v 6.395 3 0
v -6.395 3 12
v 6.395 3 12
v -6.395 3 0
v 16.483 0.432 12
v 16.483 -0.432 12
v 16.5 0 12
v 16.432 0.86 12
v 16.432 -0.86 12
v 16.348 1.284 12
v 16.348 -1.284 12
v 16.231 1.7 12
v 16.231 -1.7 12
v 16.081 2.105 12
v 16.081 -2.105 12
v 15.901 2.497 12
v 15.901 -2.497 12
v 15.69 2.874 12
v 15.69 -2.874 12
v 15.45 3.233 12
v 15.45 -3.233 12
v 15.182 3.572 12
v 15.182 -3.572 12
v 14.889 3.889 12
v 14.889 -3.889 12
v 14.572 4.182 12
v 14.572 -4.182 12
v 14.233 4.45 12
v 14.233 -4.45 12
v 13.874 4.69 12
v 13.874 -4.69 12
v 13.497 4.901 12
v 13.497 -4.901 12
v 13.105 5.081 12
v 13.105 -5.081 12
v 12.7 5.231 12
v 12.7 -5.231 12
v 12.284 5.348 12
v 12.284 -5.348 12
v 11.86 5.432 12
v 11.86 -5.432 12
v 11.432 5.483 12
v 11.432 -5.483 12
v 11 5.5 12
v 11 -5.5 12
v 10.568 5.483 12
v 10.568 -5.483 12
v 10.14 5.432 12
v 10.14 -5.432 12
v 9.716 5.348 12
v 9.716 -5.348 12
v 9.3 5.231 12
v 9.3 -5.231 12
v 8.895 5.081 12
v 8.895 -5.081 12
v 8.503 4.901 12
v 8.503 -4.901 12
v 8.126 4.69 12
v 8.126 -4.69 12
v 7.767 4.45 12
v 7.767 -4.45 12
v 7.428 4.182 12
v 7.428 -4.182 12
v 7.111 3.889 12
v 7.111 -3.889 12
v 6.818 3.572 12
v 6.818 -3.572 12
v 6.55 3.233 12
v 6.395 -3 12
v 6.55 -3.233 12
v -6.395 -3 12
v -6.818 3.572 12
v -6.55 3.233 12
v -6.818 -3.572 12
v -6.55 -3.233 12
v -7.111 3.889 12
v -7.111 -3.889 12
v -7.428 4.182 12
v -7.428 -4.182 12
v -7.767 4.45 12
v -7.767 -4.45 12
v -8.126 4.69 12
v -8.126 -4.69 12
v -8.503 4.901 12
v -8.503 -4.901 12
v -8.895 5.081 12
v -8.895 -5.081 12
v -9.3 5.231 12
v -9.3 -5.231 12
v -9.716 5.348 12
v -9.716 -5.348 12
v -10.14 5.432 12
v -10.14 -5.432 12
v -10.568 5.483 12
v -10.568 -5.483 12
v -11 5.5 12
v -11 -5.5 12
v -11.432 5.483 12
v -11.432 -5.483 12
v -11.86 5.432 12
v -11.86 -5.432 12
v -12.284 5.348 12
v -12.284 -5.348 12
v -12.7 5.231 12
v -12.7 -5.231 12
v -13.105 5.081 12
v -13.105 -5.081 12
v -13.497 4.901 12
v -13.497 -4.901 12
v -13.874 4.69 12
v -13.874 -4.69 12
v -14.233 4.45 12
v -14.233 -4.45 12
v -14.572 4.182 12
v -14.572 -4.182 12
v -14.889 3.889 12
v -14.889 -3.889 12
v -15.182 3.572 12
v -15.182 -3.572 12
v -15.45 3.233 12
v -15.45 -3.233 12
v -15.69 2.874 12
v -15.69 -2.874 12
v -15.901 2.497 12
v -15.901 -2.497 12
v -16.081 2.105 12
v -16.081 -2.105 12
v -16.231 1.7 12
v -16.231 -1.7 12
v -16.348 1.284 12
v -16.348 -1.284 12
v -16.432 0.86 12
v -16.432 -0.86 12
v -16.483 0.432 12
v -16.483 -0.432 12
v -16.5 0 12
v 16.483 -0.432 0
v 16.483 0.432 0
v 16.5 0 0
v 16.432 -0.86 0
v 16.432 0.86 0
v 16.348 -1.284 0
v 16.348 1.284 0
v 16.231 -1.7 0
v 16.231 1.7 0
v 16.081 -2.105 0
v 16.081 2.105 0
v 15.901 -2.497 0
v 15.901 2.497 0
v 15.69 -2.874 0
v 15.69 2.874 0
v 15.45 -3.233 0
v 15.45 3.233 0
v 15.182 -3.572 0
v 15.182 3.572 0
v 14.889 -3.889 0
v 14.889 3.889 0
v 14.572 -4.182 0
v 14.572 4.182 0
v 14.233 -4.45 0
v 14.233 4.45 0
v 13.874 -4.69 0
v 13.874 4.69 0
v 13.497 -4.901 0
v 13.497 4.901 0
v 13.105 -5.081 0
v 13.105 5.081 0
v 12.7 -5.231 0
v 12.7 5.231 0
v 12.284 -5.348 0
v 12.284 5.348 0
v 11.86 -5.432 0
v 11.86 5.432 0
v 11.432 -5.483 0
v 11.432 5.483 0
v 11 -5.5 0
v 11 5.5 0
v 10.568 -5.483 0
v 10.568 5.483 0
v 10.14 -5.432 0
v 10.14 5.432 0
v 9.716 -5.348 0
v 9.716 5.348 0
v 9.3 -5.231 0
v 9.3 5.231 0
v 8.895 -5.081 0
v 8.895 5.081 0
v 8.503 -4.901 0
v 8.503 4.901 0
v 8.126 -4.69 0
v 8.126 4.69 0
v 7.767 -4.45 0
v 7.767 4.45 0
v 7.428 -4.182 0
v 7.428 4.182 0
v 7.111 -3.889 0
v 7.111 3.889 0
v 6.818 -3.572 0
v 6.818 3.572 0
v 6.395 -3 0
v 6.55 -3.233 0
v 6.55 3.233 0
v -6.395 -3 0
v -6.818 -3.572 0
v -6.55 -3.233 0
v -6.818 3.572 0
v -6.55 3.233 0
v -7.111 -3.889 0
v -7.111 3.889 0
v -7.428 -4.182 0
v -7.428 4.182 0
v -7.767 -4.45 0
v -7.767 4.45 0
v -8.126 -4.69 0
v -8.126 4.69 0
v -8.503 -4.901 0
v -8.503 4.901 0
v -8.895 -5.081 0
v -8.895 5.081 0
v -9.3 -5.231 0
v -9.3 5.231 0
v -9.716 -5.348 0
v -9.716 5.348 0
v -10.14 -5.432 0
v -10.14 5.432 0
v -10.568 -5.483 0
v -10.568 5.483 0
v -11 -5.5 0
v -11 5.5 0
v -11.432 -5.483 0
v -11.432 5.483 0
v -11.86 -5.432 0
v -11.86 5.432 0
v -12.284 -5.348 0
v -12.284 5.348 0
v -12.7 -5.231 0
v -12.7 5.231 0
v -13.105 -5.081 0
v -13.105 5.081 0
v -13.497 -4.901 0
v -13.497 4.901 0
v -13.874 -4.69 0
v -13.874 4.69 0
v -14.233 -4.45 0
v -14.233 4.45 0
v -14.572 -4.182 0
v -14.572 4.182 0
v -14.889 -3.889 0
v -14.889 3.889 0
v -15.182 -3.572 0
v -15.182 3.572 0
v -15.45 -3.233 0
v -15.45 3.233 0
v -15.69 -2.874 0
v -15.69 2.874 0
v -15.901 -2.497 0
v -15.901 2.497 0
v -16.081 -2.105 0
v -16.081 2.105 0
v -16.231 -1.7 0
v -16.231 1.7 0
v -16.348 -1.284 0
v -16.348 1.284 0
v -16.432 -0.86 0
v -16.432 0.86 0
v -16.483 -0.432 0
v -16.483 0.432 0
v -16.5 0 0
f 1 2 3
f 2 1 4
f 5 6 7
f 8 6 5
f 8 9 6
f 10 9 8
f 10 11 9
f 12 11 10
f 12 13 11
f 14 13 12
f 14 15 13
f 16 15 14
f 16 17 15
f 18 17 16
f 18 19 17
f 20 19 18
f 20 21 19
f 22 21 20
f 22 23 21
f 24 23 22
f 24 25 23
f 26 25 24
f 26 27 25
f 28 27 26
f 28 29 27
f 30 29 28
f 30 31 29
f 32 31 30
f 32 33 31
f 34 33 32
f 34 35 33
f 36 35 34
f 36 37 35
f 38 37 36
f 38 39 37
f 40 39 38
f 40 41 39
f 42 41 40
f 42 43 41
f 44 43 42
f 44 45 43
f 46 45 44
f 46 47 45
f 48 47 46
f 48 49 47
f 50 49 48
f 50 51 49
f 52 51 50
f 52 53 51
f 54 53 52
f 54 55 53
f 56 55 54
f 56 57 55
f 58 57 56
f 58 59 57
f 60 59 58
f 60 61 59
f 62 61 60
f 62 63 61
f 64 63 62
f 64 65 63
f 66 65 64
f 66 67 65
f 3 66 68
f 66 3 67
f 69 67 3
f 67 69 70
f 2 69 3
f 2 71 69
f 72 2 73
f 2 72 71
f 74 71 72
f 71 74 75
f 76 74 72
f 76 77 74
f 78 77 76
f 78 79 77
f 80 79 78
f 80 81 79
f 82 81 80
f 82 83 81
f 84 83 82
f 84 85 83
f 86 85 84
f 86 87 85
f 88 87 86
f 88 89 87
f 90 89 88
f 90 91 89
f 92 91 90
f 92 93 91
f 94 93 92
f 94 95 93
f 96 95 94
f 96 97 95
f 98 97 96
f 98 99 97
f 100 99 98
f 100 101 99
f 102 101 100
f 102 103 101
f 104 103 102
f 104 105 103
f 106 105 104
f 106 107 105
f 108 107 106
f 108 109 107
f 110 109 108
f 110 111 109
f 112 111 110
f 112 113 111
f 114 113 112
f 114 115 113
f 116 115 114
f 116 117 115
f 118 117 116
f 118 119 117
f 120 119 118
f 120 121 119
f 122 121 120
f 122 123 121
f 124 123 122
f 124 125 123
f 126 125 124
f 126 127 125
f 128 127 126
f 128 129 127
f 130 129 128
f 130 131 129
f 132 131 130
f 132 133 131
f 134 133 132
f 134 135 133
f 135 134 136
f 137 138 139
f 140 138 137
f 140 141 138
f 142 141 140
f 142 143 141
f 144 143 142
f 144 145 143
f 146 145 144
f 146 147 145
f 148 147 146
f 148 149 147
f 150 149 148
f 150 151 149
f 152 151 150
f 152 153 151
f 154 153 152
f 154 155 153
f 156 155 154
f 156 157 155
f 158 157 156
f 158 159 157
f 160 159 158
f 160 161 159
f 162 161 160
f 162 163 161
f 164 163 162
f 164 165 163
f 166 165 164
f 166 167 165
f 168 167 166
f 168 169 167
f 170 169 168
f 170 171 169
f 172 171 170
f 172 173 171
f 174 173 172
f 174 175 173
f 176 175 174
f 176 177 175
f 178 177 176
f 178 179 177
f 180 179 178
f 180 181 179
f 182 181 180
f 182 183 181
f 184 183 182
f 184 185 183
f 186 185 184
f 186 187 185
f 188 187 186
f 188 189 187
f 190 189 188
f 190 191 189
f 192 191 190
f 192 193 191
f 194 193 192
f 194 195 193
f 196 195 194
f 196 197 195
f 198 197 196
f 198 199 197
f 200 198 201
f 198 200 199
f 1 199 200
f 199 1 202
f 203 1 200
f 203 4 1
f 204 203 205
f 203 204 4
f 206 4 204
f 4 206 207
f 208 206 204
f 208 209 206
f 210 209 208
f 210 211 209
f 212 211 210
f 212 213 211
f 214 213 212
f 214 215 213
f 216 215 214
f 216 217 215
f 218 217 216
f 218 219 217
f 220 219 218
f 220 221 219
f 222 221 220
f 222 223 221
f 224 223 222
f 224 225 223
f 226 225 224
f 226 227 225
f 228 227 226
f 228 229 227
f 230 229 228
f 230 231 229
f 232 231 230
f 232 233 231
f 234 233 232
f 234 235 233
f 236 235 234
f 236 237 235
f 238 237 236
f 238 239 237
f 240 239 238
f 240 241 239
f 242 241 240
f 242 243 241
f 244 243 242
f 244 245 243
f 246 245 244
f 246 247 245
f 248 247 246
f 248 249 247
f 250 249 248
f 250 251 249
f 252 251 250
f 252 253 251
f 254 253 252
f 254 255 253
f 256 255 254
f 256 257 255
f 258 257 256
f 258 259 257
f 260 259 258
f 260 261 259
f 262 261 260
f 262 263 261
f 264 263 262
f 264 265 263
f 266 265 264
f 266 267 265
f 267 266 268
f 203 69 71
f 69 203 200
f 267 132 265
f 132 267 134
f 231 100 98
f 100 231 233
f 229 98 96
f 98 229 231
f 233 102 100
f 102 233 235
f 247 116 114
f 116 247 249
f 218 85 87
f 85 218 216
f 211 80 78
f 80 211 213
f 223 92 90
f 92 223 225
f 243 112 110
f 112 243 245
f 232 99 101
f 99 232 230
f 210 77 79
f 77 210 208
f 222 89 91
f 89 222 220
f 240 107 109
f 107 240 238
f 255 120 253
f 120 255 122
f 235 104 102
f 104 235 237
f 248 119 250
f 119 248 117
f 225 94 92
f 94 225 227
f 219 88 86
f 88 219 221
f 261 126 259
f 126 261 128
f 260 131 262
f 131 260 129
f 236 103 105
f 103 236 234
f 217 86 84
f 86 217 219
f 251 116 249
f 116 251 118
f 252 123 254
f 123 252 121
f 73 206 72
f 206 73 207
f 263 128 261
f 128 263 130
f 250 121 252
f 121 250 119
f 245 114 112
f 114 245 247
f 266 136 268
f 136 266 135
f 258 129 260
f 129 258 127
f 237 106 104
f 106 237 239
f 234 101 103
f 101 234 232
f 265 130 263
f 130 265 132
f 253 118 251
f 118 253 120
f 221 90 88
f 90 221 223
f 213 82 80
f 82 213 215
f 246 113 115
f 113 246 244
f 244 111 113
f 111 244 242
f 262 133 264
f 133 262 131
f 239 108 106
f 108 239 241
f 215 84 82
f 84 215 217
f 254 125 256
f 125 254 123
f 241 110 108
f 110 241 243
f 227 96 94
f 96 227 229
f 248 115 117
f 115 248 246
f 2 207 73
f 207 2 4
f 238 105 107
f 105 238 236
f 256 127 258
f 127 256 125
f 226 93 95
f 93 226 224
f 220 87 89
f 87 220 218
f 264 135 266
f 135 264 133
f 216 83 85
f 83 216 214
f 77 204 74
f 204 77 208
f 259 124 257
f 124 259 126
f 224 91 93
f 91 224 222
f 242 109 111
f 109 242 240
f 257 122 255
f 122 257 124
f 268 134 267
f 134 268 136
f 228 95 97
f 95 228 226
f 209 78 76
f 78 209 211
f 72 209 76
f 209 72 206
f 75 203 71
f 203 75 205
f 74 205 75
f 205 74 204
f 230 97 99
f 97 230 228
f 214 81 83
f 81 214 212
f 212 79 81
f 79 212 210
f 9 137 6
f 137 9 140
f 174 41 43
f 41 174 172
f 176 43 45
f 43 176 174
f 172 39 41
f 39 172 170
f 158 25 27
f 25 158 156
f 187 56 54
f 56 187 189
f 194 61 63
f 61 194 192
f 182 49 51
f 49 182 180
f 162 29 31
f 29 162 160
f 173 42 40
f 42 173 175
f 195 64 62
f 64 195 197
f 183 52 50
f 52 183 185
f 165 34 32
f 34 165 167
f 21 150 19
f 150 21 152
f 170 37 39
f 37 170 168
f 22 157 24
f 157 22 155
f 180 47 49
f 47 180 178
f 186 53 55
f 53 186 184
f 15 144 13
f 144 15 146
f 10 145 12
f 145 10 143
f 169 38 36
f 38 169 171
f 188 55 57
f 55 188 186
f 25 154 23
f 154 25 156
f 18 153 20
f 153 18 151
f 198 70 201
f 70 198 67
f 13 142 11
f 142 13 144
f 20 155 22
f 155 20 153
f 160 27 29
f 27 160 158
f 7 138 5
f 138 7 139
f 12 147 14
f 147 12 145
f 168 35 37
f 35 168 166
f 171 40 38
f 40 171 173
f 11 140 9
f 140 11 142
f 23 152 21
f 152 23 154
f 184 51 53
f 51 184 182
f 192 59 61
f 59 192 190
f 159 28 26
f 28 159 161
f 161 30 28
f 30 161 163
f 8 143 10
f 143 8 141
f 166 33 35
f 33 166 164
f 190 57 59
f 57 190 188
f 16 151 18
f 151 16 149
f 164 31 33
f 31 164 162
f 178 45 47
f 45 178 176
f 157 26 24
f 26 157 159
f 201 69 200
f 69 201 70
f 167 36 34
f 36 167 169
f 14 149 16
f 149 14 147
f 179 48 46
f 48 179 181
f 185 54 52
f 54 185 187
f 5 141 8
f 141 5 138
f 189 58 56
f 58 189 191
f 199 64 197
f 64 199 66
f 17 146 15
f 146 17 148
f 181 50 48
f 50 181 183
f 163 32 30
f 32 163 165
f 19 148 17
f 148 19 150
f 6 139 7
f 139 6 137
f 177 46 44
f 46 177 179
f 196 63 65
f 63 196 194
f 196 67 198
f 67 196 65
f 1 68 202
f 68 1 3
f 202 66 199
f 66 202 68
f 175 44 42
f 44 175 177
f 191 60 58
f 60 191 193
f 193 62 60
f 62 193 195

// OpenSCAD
gheight=12.;
gwidth=39.;

module bank_profile(height=gheight, width=gwidth) {
	polygon( points=[[-width/2,0], [width/2,0], [width/2,height], [-width/2,height]], convexity = -1);
}

module rail_profile_negative(height=gheight, width=gwidth) {
	polygon( points= [
        [-16,-1],
        [-16,0], [-15.5,0.5], 
        [-15.5,2.5], [-15,3], 
		[-10,3], [-9.5,2.5], 
		[-9.5,0.5], [-9,0],
		[-9,-1],

		[9,-1],
		[9,0], [9.5,0.5], 
		[9.5,2.5], [10,3], 
		[15,3], [15.5,2.5], 
		[15.5,0.5], [16,0],
		[16,-1],

        [16,height+1],
        [16,height], [15.5,height-0.5], 
		[15.5,height-2.5], [15,height-3], 
		[10,height-3], [9.5,height-2.5], 
		[9.5,height-0.5], [9,height],
		[9,height+1],
 
        [-9,height+1],
		[-9,height], [-9.5,height-0.5], 
		[-9.5,height-2.5], [-10,height-3], 
		[-15,height-3], [-15.5,height-2.5],         
		[-15.5,height-0.5], [-16,height],
		[-16,height+1] 
		],

		paths=[
          [0,1,2,3,4,5,6,7,8,9], 
          [10,11,12,13,14,15,16,17,18,19],
          [20,21,22,23,24,25,26,27,28,29],
          [30,31,32,33,34,35,36,37,38,39]
	    ]);
}

module straight_bank_raw(len=214, height=gheight, width=gwidth) {
	linear_extrude(height=len) {
		bank_profile(height=height, width=width);
	}
}

module straight_rail_negative(len=214, height=gheight, width=gwidth) {
	linear_extrude(height=len) {
		rail_profile_negative(height=height, width=width);
	}
}

module straight_rail_raw(len=214, height=gheight, width=gwidth) {
	    		rotate([90,0,0]) {
                 difference() {
                 	straight_bank_raw(len=len, height=height, width=width);
					straight_rail_negative(len=len, height=height, width=width);
				}
			}
}

module straight_rail(len=214, height=gheight, width=gwidth) {
    translate([len,0,0]) rotate([0,0,-90]) union() {
    		difference() {

			straight_rail_raw(len=len, height=height, width=width);
			translate([0,-len-0.05*17,-0.05*height]) scale([1.1,1.1,1.1]) rail_lock(height=height);
    		}
    		rail_lock(height=height);
	}
}

module straight_rail_mm(len=214, height=gheight, width=gwidth) {
	translate([len,0,0]) rotate([0,0,-90]) {
		rail_lock(height=height);
		straight_rail_raw(len=len, height=height, width=width);
		rotate([0,0,180]) translate([0,len,0]) rail_lock(height=height);
	}
}

module straight_rail_ff(len=214, height=gheight, width=gwidth) {
    translate([len,0,0]) rotate([0,0,-90]) difference() {
		difference() {
			straight_rail_raw(len=len, height=height, width=width);
			translate([0,-len-0.05*17,0]) scale([1.1,1.1,1.1]) rail_lock(height=height);
		};
		rotate([0,0,180]) translate([0,-0.05*17,0]) scale([1.1,1.1,1.1]) rail_lock(height=height);
	}
}

module curved_bank_raw(radius=200, angle=360/8, height=gheight, width=gwidth) {
	difference() {
		rotate_extrude() 
			translate([-radius,0,0]) rotate(a=[-0,0,0]) 
			bank_profile(height=height, width=width);
		
		angle_cutting_block(height=height+2, radius=radius+width, angle=angle);		
	}
}

module curved_rail_negative(radius=200, angle=360/8, height=gheight, width=gwidth) {
	difference() {
		rotate_extrude() 
			translate([-radius,0,0]) rotate(a=[0,0,0]) 
			 rail_profile_negative(height=height, width=width);
		
		translate([0,0,-1])
		angle_cutting_block(height=height+2, radius=radius+width, angle=angle);
	}
}

module curved_rail_raw(radius=200, angle=360/8, height=gheight, width=gwidth) {
	difference() {
		curved_bank_raw(radius=radius, angle=angle, height=height, width=width);
		curved_rail_negative(radius=radius, angle=angle, height=height, width=width);
	}
}

module curved_rail(radius=200, angle=360/8, height=gheight, width=gwidth) {
    translate([0,-radius,0]) union() { 
		difference() {
			curved_rail_raw(radius=radius, angle=angle, height=height, width=width);
        		translate([-0.05*17,radius,0]) rotate([0,0,-90]) scale([1.1,1.1,1.1]) rail_lock(height=height);
		}
    		rotate([0,0,-angle]) translate([0,radius,0]) rotate([0,0,-90]) rail_lock(height=height);
	}
}

module curved_rail_mm(radius=200, angle=360/8, height=gheight, width=gwidth) {
	translate([0,-radius,0]) union() {
		rotate([0,0,-angle]) translate([0,radius,0]) rotate([0,0,-90]) rail_lock(height=height);
		curved_rail_raw(radius=radius, angle=angle, height=height, width=width);
		translate([0,radius,0]) rotate([0,0,90]) rail_lock(height=height);
	}
}

module curved_rail_ff(radius=200, angle=360/8, height=gheight, width=gwidth) {
	translate([0,-radius,0]) difference() {
		difference() {
			curved_rail_raw(radius=radius, angle=angle, height=height, width=width);
			translate([-0.05*17,radius,0]) rotate([0,0,-90]) scale([1.1,1.1,1.1]) rail_lock(height=height);
		}
		rotate([0,0,-angle]) translate([0.05*17,radius,0]) rotate([0,0,90]) scale([1.1,1.1,1.1]) rail_lock(height=height);
	}
}

module rail_lock(height=gheight) {
	translate([-3,-1,0]) cube([6, 8, height]);
	translate([0,11,0]) cylinder(h=height, d=11);
}

module male_male_rail_lock(height=gheight) {
	rotate([0,0,90]) union() {
		rotate([0,0,180]) rail_lock(height=height);
		rail_lock(height=height);
	}
}

module angle_cutting_block(height, radius ,angle) {
    linear_extrude(height=height) {
    		if (sin(angle) > 0) {
			polygon(points = [ [0, radius], [0, 0],
				[sin(angle)*radius, cos(angle)*radius],
        			[radius, cos(angle)*radius],
        			[radius, -radius],
        			[-radius, -radius],
        			[-radius, radius] 
			]);
    		} else {
			polygon(points = [ [0,radius], [0,0],
				[sin(angle)*radius, cos(angle)*radius],
				[-radius, cos(angle)*radius],
				[-radius, radius]
			]);
    		}
	}
}

module shunt_raw(len=214, height=gheight, width=gwidth, radius=200, angle=360/8) {
    difference() {
	    union() {
            rotate([90,0,90]) 
            straight_bank_raw(len=len, height=height, width=width);
            translate([0,-radius,0]) 
            curved_bank_raw(radius=radius, angle=angle, height=height, width=width);
	    };
        union() {
            rotate([90,0,90]) 
            straight_rail_negative(len=len, height=height, width=width);
            translate([0,-radius,0]) 
            curved_rail_negative(radius=radius, angle=angle, height=height, width=width);
        }
    }	
}

module shunt_mff(len=151, height=gheight, width=gwidth, radius=200, angle=360/8) {
	difference() {
        union() {
    		    difference() {
                shunt_raw(len=len, height=height, width=width, radius=radius, angle=angle);
			    translate([len-0.05*17,0,-0.05*height]) scale([1.1,1.1,1.1]) 
                 rotate([0,0,90]) rail_lock(height=height);
    		    }
    		    rotate([0,0,90]) rail_lock(height=height);
	    };
	    translate([0,-radius,0]) rotate([0,0,-angle]) 
        translate([0,radius,0]) rotate([0,0,90]) 
        scale([1.1,1.1,1.1]) rail_lock(height=height);	
    }
}

module shunt_fmm(len=151, height=gheight, width=gwidth, radius=200, angle=360/8) {
	union() {
        difference() {
    		    union() {
                shunt_raw(len=len, height=height, width=width, radius=radius, angle=angle);
			    translate([len,0,0]) 
                 rotate([0,0,-90]) rail_lock(height=height);
    		    };
    		    translate([0.05*17,0,0]) rotate([0,0,-90]) scale([1.1,1.1,1.1]) 
            rail_lock(height=height);
	    };
        translate([0,-radius,0]) rotate([0,0,-angle]) 
        translate([0,radius,0]) rotate([0,0,-90]) 
        rail_lock(height=height);	
    }
}

module shunt_3way_raw(len=151, height=gheight, width=gwidth, radius=200, angle=360/8) {
    difference() {
	    union() {
            rotate([90,0,90]) 
            straight_bank_raw(len=len, height=height, width=width);
            translate([0,-radius,0]) 
            curved_bank_raw(radius=radius, angle=angle, height=height, width=width);
            rotate([180,0,0]) translate([0,-radius,-height]) 
            curved_bank_raw(radius=radius, angle=angle, height=height, width=width);

	    };
        union() {
            rotate([90,0,90]) 
            straight_rail_negative(len=len, height=height, width=width);
            translate([0,-radius,0]) 
            curved_rail_negative(radius=radius, angle=angle, height=height, width=width);
            rotate([180,0,0]) translate([0,-radius,-height]) 
            curved_rail_negative(radius=radius, angle=angle, height=height, width=width);
        }
    }	
}

module shunt_3way_fmmm(len=151, height=gheight, width=gwidth, radius=200, angle=360/8) {
    difference() {
	    shunt_3way_raw(len=len, height=height, width=width, radius=radius, angle=angle);
        translate([-0.05*17,0,-0.5]) rotate([0,0,-90]) scale([1.1,1.1,1.1]) 
        rail_lock(height=height);
    }
    translate([len,0,0]) rotate([0,0,-90]) rail_lock(height=height);
    translate([0,-radius,0]) rotate([0,0,-angle]) translate([0,radius,0]) rotate([0,0,-90]) rail_lock(height=height);
    translate([0,radius,0]) rotate([0,0,angle]) translate([0,-radius,0]) rotate([0,0,-90]) rail_lock(height=height);
}

module shunt_3way_mfff(len=151, height=gheight, width=gwidth, radius=200, angle=360/8) {
    difference() {
        union() {
	        shunt_3way_raw(len=len, height=height, width=width, radius=radius, angle=angle);
            rotate([0,0,90]) 
            rail_lock(height=height);
        };
        union() {
            translate([len+0.05*17,0,-0.5]) rotate([0,0,90]) scale([1.1,1.1,1.1]) 
            rail_lock(height=height);
        
            translate([0,-radius,0]) rotate([0,0,-angle]) 
            translate([0.05*17,radius,-0.5]) rotate([0,0,90]) 
            scale([1.1,1.1,1.1]) rail_lock(height=height);
    
            translate([0,radius,0]) rotate([0,0,angle]) 
            translate([0.05*17,-radius,-0.5]) rotate([0,0,90]) 
            scale([1.1,1.1,1.1]) rail_lock(height=height);
	    }
    }
}

module shunt_t_raw(height=gheight, width=gwidth, radius=100) {
	angle=90;
    len=2*radius;
	
    difference() {
	    union() {
            rotate([90,0,90]) 
            straight_bank_raw(len=len, height=height, width=width);
            translate([0,-radius,0]) 
            curved_bank_raw(radius=radius, angle=angle, height=height, width=width);
            rotate([0,180,0]) translate([-2*radius,-radius,-height]) 
            curved_bank_raw(radius=radius, angle=angle, height=height, width=width);

	    };

        union() {
            rotate([90,0,90]) 
            straight_rail_negative(len=len, height=height, width=width);
            translate([0,-radius,0]) 
            curved_rail_negative(radius=radius, angle=angle, height=height, width=width);
            rotate([0,180,0]) translate([-2*radius,-radius,-height]) 
            curved_rail_negative(radius=radius, angle=angle, height=height, width=width);
        };
    }		
}

module shunt_t_mfm(height=gheight, width=gwidth, radius=100) {
    difference() {
        union() {
            shunt_t_raw(height=height, width=width, radius=radius);
            //rotate([0,0,90]) rail_lock(height=height);
            //translate([0,-radius,0]) rotate([0,0,-90]) translate([0,radius,0]) rotate([0,0,-90]) rail_lock(height=height);
        };
        translate([2*radius+0.05*17,0,-0.5]) rotate([0,0,90]) 
        scale([1.1,1.1,1.1]) rail_lock(height=height);
        rotate([0,0,-90]) 
        scale([1.1,1.1,1.1]) rail_lock(height=height);
        translate([0,-radius,0]) rotate([0,0,-90]) 
        translate([0,radius,0]) rotate([0,0,90]) 
        scale([1.1,1.1,1.1]) rail_lock(height=height);
    }
}


$fn=80;
 //rotate([0,0,-90]) shunt_t_mfm();
male_male_rail_lock();
// Standard set of rails I found home
//translate([-30,250,12]) rotate([0,180,0]) shunt_3way_fmmm();
//translate([30,250,0]) shunt_3way_mfff();
/*translate([0,150,0]) straight_rail(len=52);
translate([0,100,0]) straight_rail(len=60);
translate([0,50,0]) straight_rail(len=151);
straight_rail(len=214);
translate([0,-50,0]) curved_rail(radius=200, angle=360/8);
translate([0,-100,0]) curved_rail(radius=225/2, angle=360/9);
translate([0,-150,0]) curved_rail(radius=100, angle=360/8);
translate([30,-250,0]) shunt_mff($fn=80);
translate([-30,-250,12]) rotate([0,180,0]) shunt_fmm();
translate([0,-350,0]) male_male_rail_lock();

translate([-300,100,0]) rotate([0,0,-90]) shunt_t_mfm();

//Male-male versions
translate([-250,0,0]) {
translate([0,150,0]) straight_rail_mm(len=52);
translate([0,100,0]) straight_rail_mm(len=60);
translate([0,50,0]) straight_rail_mm(len=151);
straight_rail_mm(len=214);
translate([0,-50,0]) curved_rail_mm(radius=200, angle=360/8);
translate([0,-100,0]) curved_rail_mm(radius=225/2, angle=360/9);
translate([0,-150,0]) curved_rail_mm(radius=100, angle=360/8);
}


//Female-female versions
translate([250,0,0]) {
translate([0,150,0]) straight_rail_ff(len=52);
translate([0,100,0]) straight_rail_ff(len=60);
translate([0,50,0]) straight_rail_ff(len=151);
straight_rail_ff(len=214);
translate([0,-50,0]) curved_rail_ff(radius=200, angle=360/8);
translate([0,-100,0]) curved_rail_ff(radius=225/2, angle=360/9);
translate([0,-150,0])
    curved_rail_ff(radius=100, angle=360/8);
}

*/
